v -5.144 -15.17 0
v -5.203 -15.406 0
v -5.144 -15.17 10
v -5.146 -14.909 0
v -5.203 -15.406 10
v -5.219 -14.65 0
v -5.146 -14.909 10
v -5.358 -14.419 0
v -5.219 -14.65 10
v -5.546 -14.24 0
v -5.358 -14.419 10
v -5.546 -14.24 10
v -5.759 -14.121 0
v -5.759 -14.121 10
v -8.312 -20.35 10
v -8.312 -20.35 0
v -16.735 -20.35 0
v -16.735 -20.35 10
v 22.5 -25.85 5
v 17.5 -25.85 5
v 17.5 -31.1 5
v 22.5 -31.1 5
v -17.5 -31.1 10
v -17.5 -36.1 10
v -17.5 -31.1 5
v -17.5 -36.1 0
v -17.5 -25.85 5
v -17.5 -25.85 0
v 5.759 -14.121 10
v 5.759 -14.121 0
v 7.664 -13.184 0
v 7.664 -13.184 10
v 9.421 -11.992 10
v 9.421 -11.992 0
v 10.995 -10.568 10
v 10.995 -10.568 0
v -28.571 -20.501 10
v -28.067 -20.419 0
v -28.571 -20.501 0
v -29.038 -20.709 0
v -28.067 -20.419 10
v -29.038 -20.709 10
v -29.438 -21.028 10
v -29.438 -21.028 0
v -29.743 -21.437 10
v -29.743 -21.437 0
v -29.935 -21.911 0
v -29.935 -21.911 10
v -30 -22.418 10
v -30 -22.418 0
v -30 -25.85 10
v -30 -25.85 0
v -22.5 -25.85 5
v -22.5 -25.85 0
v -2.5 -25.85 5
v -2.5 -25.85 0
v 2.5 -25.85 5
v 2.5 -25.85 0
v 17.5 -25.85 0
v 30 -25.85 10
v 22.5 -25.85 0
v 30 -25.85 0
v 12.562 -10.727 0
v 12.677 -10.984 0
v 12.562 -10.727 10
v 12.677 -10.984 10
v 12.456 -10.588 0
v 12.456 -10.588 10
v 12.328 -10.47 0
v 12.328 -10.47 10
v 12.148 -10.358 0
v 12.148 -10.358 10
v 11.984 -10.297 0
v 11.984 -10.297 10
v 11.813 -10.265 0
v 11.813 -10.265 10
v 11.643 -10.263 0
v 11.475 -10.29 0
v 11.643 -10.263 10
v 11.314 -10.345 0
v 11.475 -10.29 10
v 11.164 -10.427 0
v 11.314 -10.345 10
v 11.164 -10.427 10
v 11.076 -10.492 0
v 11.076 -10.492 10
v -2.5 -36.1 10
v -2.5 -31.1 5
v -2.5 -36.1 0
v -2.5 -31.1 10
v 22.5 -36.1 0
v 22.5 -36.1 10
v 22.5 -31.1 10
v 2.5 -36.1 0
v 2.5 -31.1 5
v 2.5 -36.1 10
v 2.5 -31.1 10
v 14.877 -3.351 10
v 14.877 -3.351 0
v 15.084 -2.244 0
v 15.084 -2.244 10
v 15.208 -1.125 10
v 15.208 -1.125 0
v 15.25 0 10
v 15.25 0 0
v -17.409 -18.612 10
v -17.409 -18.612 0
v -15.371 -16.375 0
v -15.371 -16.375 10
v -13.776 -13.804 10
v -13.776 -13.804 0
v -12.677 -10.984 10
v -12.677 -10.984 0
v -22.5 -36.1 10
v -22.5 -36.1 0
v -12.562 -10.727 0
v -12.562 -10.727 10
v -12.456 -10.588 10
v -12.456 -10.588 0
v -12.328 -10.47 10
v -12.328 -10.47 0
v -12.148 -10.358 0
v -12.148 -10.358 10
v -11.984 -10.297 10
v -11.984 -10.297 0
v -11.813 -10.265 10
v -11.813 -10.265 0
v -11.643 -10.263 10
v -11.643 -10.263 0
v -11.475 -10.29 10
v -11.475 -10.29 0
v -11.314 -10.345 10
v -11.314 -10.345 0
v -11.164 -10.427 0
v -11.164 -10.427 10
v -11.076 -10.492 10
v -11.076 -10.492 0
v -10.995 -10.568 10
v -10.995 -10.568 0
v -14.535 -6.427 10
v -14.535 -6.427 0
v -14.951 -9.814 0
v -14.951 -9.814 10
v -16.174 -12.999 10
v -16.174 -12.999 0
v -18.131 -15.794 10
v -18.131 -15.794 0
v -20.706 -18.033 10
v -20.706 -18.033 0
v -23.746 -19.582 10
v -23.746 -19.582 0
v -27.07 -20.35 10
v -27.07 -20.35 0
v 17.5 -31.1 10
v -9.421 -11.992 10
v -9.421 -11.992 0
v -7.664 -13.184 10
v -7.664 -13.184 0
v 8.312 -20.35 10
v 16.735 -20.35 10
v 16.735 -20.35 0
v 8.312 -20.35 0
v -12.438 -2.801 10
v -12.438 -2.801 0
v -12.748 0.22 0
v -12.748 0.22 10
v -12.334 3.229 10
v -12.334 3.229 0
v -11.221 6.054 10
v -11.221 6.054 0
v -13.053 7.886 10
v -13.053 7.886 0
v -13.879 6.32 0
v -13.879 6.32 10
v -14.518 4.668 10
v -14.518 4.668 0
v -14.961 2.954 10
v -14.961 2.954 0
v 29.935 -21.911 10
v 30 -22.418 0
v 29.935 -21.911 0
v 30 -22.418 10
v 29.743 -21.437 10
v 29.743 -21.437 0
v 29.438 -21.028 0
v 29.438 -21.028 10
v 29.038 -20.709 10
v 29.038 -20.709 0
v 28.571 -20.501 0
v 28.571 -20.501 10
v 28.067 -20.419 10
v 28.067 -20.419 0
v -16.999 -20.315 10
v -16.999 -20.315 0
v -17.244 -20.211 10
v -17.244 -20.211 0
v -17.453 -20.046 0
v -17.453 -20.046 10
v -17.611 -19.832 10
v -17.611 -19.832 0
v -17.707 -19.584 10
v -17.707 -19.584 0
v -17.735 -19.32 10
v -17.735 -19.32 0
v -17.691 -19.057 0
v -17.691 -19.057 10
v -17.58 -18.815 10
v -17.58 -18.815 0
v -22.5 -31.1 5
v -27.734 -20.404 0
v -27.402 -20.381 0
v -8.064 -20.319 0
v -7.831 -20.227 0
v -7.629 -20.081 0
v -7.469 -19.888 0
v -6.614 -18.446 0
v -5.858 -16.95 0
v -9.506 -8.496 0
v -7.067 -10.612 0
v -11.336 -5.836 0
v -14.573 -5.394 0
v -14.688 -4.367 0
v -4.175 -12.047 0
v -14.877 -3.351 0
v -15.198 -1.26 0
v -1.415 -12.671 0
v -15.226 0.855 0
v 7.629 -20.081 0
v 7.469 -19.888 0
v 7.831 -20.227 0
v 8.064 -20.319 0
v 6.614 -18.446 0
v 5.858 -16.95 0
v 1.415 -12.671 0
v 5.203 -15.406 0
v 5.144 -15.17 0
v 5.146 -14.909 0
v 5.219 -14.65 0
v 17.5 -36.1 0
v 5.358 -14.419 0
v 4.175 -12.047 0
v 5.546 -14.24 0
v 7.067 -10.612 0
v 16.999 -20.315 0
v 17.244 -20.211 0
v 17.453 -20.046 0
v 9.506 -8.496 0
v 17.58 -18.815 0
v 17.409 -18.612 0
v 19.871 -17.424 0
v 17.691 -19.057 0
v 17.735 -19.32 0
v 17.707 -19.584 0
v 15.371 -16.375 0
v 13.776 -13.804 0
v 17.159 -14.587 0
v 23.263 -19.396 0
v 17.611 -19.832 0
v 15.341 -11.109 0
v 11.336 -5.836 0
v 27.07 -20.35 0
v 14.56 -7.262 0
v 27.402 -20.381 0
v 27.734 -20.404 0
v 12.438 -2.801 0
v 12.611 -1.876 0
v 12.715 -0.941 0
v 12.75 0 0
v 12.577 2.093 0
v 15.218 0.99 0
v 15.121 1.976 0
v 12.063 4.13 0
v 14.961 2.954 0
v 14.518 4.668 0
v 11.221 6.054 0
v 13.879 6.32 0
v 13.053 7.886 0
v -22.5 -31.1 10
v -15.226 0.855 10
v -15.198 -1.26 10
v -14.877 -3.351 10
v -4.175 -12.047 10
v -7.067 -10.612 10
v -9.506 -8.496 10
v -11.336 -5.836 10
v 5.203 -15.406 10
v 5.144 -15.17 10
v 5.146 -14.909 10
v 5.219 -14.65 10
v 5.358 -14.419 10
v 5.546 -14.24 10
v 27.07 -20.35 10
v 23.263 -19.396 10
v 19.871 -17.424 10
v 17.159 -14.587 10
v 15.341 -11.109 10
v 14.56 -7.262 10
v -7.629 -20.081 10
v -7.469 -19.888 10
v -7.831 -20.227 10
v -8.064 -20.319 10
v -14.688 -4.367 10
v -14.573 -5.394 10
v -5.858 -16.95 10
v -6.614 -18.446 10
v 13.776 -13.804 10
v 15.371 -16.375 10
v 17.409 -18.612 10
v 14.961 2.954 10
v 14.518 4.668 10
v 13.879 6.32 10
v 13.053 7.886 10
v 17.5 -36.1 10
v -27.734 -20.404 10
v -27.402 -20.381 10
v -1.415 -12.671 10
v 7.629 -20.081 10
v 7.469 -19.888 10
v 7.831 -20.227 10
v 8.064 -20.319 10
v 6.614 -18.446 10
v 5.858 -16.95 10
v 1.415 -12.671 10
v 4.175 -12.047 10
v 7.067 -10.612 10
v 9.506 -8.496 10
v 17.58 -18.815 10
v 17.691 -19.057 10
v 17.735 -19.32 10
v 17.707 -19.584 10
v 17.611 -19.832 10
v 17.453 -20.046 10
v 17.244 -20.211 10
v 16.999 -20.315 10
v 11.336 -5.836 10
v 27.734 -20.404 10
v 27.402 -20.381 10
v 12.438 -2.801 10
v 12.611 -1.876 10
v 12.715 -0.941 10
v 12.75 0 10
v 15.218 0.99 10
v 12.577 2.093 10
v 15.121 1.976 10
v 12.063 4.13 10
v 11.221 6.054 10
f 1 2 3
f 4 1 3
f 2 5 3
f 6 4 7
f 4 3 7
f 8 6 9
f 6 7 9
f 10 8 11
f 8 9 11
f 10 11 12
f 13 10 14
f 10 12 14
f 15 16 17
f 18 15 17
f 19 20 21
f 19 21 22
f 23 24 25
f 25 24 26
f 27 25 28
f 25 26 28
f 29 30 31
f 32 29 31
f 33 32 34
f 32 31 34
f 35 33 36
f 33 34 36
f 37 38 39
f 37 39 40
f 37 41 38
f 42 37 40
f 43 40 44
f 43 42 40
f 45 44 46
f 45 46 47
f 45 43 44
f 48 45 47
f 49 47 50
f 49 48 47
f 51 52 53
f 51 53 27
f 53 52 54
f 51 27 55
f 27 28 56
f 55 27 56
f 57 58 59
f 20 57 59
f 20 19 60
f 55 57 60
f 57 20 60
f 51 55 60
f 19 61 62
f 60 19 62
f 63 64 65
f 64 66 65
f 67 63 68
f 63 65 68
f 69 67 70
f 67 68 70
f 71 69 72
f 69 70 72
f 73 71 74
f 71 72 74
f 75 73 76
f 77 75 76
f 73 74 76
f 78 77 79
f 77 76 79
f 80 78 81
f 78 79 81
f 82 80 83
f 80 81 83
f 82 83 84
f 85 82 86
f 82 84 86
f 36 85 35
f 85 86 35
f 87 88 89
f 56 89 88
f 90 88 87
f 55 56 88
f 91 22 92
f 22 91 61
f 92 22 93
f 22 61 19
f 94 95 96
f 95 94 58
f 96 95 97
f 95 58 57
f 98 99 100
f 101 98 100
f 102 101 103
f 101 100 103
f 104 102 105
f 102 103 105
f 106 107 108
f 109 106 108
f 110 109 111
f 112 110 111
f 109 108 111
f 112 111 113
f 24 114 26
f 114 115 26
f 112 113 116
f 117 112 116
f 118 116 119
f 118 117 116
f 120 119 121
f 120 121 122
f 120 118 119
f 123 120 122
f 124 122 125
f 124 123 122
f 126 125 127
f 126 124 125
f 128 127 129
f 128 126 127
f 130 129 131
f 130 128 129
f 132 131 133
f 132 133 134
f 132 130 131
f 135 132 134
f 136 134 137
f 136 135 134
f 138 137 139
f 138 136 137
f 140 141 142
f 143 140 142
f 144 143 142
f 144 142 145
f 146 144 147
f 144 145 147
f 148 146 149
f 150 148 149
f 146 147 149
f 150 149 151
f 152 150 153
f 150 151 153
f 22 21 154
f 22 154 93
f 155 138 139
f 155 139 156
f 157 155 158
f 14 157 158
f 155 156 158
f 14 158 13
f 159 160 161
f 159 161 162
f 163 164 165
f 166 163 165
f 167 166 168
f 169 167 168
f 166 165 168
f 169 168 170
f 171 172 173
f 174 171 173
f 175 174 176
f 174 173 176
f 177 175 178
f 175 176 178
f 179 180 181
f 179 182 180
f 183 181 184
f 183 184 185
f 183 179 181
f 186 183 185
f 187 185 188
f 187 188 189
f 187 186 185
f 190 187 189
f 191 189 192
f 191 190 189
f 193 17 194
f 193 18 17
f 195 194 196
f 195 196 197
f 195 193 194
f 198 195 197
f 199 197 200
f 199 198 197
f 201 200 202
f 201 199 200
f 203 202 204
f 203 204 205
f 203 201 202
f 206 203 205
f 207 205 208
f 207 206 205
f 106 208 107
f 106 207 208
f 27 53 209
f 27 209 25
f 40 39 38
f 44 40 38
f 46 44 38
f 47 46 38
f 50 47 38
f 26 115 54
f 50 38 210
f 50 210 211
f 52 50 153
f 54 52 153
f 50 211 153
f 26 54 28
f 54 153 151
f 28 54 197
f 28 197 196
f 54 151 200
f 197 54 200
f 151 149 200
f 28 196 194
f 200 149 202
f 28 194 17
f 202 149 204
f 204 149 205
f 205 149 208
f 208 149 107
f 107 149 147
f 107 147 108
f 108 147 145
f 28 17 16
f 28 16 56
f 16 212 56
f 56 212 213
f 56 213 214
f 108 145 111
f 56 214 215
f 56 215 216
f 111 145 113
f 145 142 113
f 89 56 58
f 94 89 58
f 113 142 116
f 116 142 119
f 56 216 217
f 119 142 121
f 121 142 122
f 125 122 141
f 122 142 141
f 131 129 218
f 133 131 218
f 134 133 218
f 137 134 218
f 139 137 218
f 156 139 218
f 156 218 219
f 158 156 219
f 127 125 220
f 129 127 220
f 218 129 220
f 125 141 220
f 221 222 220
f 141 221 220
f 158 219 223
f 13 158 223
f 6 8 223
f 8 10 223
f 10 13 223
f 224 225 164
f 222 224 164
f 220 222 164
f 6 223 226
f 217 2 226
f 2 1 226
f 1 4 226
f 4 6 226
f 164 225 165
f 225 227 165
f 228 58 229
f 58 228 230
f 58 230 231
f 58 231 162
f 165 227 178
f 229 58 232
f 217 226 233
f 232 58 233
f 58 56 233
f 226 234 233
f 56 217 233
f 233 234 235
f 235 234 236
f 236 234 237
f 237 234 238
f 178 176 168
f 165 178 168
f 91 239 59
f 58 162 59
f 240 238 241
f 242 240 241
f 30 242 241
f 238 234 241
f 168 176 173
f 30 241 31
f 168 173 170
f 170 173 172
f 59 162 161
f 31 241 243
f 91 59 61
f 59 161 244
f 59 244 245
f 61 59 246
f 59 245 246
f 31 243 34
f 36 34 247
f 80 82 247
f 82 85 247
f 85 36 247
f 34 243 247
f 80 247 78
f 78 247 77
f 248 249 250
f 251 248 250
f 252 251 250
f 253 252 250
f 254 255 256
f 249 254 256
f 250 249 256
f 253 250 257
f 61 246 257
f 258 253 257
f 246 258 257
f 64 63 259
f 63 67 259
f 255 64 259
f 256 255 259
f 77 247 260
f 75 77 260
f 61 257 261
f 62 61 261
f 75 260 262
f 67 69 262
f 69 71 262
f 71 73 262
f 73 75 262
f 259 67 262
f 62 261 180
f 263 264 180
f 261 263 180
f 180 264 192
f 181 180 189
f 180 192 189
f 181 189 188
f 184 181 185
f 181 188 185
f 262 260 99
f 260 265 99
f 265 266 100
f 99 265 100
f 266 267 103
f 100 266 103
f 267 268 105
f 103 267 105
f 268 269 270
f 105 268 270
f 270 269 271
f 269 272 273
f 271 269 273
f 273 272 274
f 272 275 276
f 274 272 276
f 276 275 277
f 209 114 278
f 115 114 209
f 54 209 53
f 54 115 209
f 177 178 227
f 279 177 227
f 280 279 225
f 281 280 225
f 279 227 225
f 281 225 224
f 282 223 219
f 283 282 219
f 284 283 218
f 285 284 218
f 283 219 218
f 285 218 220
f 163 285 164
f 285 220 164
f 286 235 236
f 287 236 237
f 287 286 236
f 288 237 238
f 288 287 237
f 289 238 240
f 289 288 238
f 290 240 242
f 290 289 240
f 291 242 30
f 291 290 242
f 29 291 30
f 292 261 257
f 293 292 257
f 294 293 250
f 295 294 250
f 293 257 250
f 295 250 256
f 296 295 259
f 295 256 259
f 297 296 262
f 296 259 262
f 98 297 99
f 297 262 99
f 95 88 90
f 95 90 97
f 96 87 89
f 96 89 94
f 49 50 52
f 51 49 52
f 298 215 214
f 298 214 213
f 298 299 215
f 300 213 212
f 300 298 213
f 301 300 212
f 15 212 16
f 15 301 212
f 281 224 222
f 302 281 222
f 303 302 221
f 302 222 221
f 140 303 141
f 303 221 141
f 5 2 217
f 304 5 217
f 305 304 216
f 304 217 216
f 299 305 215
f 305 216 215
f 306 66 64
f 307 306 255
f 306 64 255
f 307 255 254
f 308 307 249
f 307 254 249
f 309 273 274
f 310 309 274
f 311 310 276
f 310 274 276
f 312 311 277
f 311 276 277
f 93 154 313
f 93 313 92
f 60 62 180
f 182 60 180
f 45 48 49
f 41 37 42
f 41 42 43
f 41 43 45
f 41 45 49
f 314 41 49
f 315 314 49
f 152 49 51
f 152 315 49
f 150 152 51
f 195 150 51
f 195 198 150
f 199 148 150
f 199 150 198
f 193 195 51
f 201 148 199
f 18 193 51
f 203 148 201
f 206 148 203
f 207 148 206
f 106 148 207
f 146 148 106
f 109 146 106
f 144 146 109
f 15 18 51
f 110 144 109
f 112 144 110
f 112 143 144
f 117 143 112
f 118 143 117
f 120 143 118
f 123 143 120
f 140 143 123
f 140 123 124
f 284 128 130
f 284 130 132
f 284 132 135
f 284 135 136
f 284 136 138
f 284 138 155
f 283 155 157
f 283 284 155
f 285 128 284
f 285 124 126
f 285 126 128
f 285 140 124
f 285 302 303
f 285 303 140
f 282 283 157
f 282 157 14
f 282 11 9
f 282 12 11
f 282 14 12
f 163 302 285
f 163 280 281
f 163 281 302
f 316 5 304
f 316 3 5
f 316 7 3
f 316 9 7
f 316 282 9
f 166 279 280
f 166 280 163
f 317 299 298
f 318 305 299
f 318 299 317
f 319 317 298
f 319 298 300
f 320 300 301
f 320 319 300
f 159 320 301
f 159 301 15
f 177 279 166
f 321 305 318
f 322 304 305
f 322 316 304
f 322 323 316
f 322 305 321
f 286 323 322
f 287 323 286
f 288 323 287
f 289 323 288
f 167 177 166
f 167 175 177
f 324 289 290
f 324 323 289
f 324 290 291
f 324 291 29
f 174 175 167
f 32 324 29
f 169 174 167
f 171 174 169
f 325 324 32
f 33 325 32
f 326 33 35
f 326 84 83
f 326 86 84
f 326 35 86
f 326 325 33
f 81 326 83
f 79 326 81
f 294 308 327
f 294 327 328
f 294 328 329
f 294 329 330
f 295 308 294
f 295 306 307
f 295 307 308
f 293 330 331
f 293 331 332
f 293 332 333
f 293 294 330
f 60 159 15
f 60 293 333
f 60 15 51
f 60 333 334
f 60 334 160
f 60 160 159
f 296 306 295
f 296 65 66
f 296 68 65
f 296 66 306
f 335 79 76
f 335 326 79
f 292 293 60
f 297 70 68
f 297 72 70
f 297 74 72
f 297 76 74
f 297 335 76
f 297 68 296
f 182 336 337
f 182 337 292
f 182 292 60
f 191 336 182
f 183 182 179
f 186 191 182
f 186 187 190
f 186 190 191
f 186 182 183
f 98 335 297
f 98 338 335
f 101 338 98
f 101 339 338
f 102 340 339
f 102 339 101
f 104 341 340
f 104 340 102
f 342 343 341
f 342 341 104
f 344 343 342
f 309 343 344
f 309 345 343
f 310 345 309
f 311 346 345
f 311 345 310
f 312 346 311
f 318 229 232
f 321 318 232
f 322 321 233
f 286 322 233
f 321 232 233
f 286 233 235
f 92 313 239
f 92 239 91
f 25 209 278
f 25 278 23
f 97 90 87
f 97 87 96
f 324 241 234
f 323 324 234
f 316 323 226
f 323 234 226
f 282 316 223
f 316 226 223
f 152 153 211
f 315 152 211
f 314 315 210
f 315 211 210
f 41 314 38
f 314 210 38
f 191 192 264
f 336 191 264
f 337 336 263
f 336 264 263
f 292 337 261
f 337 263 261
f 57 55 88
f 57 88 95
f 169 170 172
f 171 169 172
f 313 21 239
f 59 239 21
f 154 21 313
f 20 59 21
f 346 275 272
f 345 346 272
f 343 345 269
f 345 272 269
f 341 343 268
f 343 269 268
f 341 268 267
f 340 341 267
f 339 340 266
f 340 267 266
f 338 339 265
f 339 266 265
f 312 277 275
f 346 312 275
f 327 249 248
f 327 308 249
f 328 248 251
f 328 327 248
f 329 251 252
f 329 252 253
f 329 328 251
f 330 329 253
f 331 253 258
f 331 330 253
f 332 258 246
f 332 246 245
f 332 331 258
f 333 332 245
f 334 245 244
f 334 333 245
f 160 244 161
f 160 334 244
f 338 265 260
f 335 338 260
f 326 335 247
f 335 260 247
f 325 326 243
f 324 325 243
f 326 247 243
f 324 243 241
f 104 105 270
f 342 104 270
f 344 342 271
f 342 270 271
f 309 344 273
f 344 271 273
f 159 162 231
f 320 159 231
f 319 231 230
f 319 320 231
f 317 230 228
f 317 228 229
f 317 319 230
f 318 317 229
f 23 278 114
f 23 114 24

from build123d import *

# Parameters (mm, degrees)
F1_DEPTH = 10
F2_R     = 1
F3_R     = 2
F4_W     = 5
F4_H     = 5
F5_DEPTH = 10.25
F6_W     = 5
F6_H     = 5
F7_W     = 5
F7_H     = 5
F8_W     = 5
F8_H     = 5
F9_DEPTH = 5


with BuildPart() as f1:
    # F0 (on Top) → F1 (new body)
    with BuildSketch(Plane.XY):
        with BuildLine():
            ThreePointArc((4.8593298853, -14.4550826032), (4.4870695728, -13.259622802), (4.1751297651, -12.0470241738))
            ThreePointArc((4.1751297651, -12.0470241738), (0, -12.75), (-4.1751297651, -12.0470241738))
            ThreePointArc((-4.1751297651, -12.0470241738), (-4.4870695728, -13.259622802), (-4.8593298853, -14.4550826032))
            ThreePointArc((-4.8593298853, -14.4550826032), (-2.4619596159, -15.0499586328), (0, -15.25))
            ThreePointArc((0, -15.25), (2.4619596159, -15.0499586328), (4.8593298853, -14.4550826032))
        make_face()
        with BuildLine():
            ThreePointArc((0, -15.25), (-2.4619596159, -15.0499586328), (-4.8593298853, -14.4550826032))
            ThreePointArc((-4.8593298853, -14.4550826032), (-6.1206106512, -17.4986832949), (-7.7711643122, -20.35))
            Line((-7.7711643122, -20.35), (0, -20.35))
            Line((0, -20.35), (0, -15.25))
        make_face()
        with BuildLine():
            ThreePointArc((7.7711643122, -20.35), (6.1206106512, -17.4986832949), (4.8593298853, -14.4550826032))
            ThreePointArc((4.8593298853, -14.4550826032), (2.4619596159, -15.0499586328), (0, -15.25))
            Line((0, -15.25), (0, -20.35))
            Line((0, -20.35), (7.7711643122, -20.35))
        make_face()
        with BuildLine():
            ThreePointArc((-12.1977073115, -25.35), (-9.8167372296, -22.998464997), (-7.7711643122, -20.35))
            Line((-7.7711643122, -20.35), (-19.6810808999, -20.35))
            ThreePointArc((-19.6810808999, -20.35), (-24.6329372033, -22.4587536765), (-30, -22.8616926958))
            Line((-30, -22.8616926958), (-30, -25.35))
            Line((-30, -25.35), (-12.1977073115, -25.35))
        make_face()
        with BuildLine():
            Line((-30, -20.35), (-30, -22.8616926958))
            ThreePointArc((-30, -22.8616926958), (-24.6329372033, -22.4587536765), (-19.6810808999, -20.35))
            Line((-19.6810808999, -20.35), (-27.0704207387, -20.35))
            ThreePointArc((-27.0704207387, -20.35), (-28.5352103694, -20.4268397503), (-30, -20.35))
        make_face()
        with BuildLine():
            Line((0, -20.35), (-7.7711643122, -20.35))
            ThreePointArc((-7.7711643122, -20.35), (-9.8167372296, -22.998464997), (-12.1977073115, -25.35))
            Line((-12.1977073115, -25.35), (0, -25.35))
            Line((0, -25.35), (0, -20.35))
        make_face()
        with BuildLine():
            ThreePointArc((12.1977073115, -25.35), (9.8167372296, -22.998464997), (7.7711643122, -20.35))
            Line((7.7711643122, -20.35), (0, -20.35))
            Line((0, -20.35), (0, -25.35))
            Line((0, -25.35), (12.1977073115, -25.35))
        make_face()
        with BuildLine():
            Line((19.6810808999, -20.35), (7.7711643122, -20.35))
            ThreePointArc((7.7711643122, -20.35), (9.8167372296, -22.998464997), (12.1977073115, -25.35))
            Line((12.1977073115, -25.35), (30, -25.35))
            Line((30, -25.35), (30, -22.8616926958))
            ThreePointArc((30, -22.8616926958), (24.6329372033, -22.4587536765), (19.6810808999, -20.35))
        make_face()
        with BuildLine():
            Line((27.0704207387, -20.35), (19.6810808999, -20.35))
            ThreePointArc((19.6810808999, -20.35), (24.6329372033, -22.4587536765), (30, -22.8616926958))
            Line((30, -22.8616926958), (30, -20.35))
            ThreePointArc((30, -20.35), (28.5352103694, -20.4268397503), (27.0704207387, -20.35))
        make_face()
        with BuildLine():
            ThreePointArc((-12.0352103694, -6.4268397503), (-12.1363238462, -4.6029645348), (-12.438425012, -2.8014430604))
            ThreePointArc((-12.438425012, -2.8014430604), (-13.4233051179, 0.1973824432), (-14.9612028693, 2.9537956434))
            ThreePointArc((-14.9612028693, 2.9537956434), (-15.2486507313, -0.2028567877), (-14.8773319104, -3.3507454733))
            ThreePointArc((-14.8773319104, -3.3507454733), (-13.863287972, -6.3538765023), (-12.2503272762, -9.0825096547))
            ThreePointArc((-12.2503272762, -9.0825096547), (-12.0890775255, -7.7590238521), (-12.0352103694, -6.4268397503))
        make_face()
        with BuildLine():
            ThreePointArc((-4.8593298853, -14.4550826032), (-4.4870695728, -13.259622802), (-4.1751297651, -12.0470241738))
            ThreePointArc((-4.1751297651, -12.0470241738), (-9.5064579689, -8.4964555484), (-12.438425012, -2.8014430604))
            ThreePointArc((-12.438425012, -2.8014430604), (-12.1363238462, -4.6029645348), (-12.0352103694, -6.4268397503))
            ThreePointArc((-12.0352103694, -6.4268397503), (-12.0890775255, -7.7590238521), (-12.2503272762, -9.0825096547))
            ThreePointArc((-12.2503272762, -9.0825096547), (-8.9666731326, -12.3353667531), (-4.8593298853, -14.4550826032))
        make_face()
        with BuildLine():
            ThreePointArc((12.4384250802, -2.8014427577), (9.5064580723, -8.4964554327), (4.1751297651, -12.0470241738))
            ThreePointArc((4.1751297651, -12.0470241738), (4.4870695728, -13.259622802), (4.8593298853, -14.4550826032))
            ThreePointArc((4.8593298853, -14.4550826032), (8.9666731326, -12.3353667531), (12.2503272762, -9.0825096547))
            ThreePointArc((12.2503272762, -9.0825096547), (12.0426040821, -5.9329391), (12.4384250802, -2.8014427577))
        make_face()
        with BuildLine():
            ThreePointArc((14.9612028693, 2.9537956434), (13.4233051801, 0.1973825853), (12.4384250802, -2.8014427577))
            ThreePointArc((12.4384250802, -2.8014427577), (12.0426040821, -5.9329391), (12.2503272762, -9.0825096547))
            ThreePointArc((12.2503272762, -9.0825096547), (13.8632879655, -6.3538765165), (14.8773319036, -3.3507455038))
            ThreePointArc((14.8773319036, -3.3507455038), (15.1565466306, -1.6857028906), (15.25, 0))
            ThreePointArc((15.25, 0), (15.177628994, 1.4839400666), (14.9612028693, 2.9537956434))
        make_face()
        with BuildLine():
            ThreePointArc((-19.6810808999, -20.35), (-14.7609019356, -15.5108051385), (-12.2503272762, -9.0825096547))
            ThreePointArc((-12.2503272762, -9.0825096547), (-13.863287972, -6.3538765023), (-14.8773319104, -3.3507454733))
            ThreePointArc((-14.8773319104, -3.3507454733), (-14.621003629, -4.8793092054), (-14.5352103694, -6.4268397503))
            ThreePointArc((-14.5352103694, -6.4268397503), (-18.1307148307, -15.7941484666), (-27.0704207387, -20.35))
            Line((-27.0704207387, -20.35), (-19.6810808999, -20.35))
        make_face()
        with BuildLine():
            ThreePointArc((14.8773319036, -3.3507455038), (13.8632879655, -6.3538765165), (12.2503272762, -9.0825096547))
            ThreePointArc((12.2503272762, -9.0825096547), (14.7609019356, -15.5108051385), (19.6810808999, -20.35))
            Line((19.6810808999, -20.35), (27.0704207387, -20.35))
            ThreePointArc((27.0704207387, -20.35), (17.1590319273, -14.5866537221), (14.8773319036, -3.3507455038))
        make_face()
        with BuildLine():
            ThreePointArc((-12.438425012, -2.8014430604), (-12.6311834993, 1.7365780743), (-11.2209196713, 6.0542102482))
            Line((-11.2209196713, 6.0542102482), (-13.0527161264, 7.8860067033))
            ThreePointArc((-13.0527161264, 7.8860067033), (-14.2223975074, 5.5032634991), (-14.9612028693, 2.9537956434))
            ThreePointArc((-14.9612028693, 2.9537956434), (-13.4233051179, 0.1973824432), (-12.438425012, -2.8014430604))
        make_face()
        with BuildLine():
            Line((13.0527161264, 7.8860067033), (11.2209196713, 6.0542102482))
            ThreePointArc((11.2209196713, 6.0542102482), (12.3618207763, 3.1221606454), (12.75, 0))
            ThreePointArc((12.75, 0), (12.6718668667, -1.4093580502), (12.4384250802, -2.8014427577))
            ThreePointArc((12.4384250802, -2.8014427577), (13.4233051801, 0.1973825853), (14.9612028693, 2.9537956434))
            ThreePointArc((14.9612028693, 2.9537956434), (14.2223975074, 5.5032634991), (13.0527161264, 7.8860067033))
        make_face()
        with BuildLine():
            Line((-30, -25.85), (-12.7954249224, -25.85))
            ThreePointArc((-12.7954249224, -25.85), (-12.4946178162, -25.6023290673), (-12.1977073115, -25.35))
            Line((-12.1977073115, -25.35), (-30, -25.35))
            Line((-30, -25.35), (-30, -25.85))
        make_face()
        with BuildLine():
            ThreePointArc((12.7954249224, -25.85), (12.4946178162, -25.6023290673), (12.1977073115, -25.35))
            Line((12.1977073115, -25.35), (0, -25.35))
            Line((0, -25.35), (-12.1977073115, -25.35))
            ThreePointArc((-12.1977073115, -25.35), (-12.4946178162, -25.6023290673), (-12.7954249224, -25.85))
            Line((-12.7954249224, -25.85), (12.7954249224, -25.85))
        make_face()
        with BuildLine():
            Line((30, -25.35), (12.1977073115, -25.35))
            ThreePointArc((12.1977073115, -25.35), (12.4946178162, -25.6023290673), (12.7954249224, -25.85))
            Line((12.7954249224, -25.85), (30, -25.85))
            Line((30, -25.85), (30, -25.35))
        make_face()
    extrude(amount=F1_DEPTH)

    # F2
    f2_edges = [f1.edges().sort_by_distance(p)[0] for p in [
        (-7.771164, -20.35, 5),
        (-4.85933, -14.455083, 5),
        (-12.250327, -9.08251, 5),
        (-19.681081, -20.35, 5),
        (7.771164, -20.35, 5),
        (4.85933, -14.455083, 5),
        (12.250327, -9.08251, 5),
        (19.681081, -20.35, 5),
    ]]
    fillet(f2_edges, radius=F2_R)

    # F3
    f3_edges = [f1.edges().sort_by_distance(p)[0] for p in [
        (30, -20.35, 5),
        (-30, -20.35, 5),
    ]]
    fillet(f3_edges, radius=F3_R)

    # F4 (on face) → F5 (join)
    with BuildSketch(Plane.XZ.offset(25.85)):
        with Locations((-20, 2.5)):
            Rectangle(F4_W, F4_H)
        with Locations((0, 2.5)):
            Rectangle(F4_W, F4_H)
        with Locations((20, 2.5)):
            Rectangle(F4_W, F4_H)
    extrude(amount=F5_DEPTH)

    # F6 (on face) + F7 (on face) + F8 (on face) → F9 (join)
    with BuildSketch(Plane.XY.offset(5)):
        with Locations((-20, -33.6)):
            Rectangle(F6_W, F6_H)
    with BuildSketch(Plane.XY.offset(5)):
        with Locations((0, -33.6)):
            Rectangle(F7_W, F7_H)
    with BuildSketch(Plane.XY.offset(5)):
        with Locations((20, -33.6)):
            Rectangle(F8_W, F8_H)
    extrude(amount=F9_DEPTH)


solid = f1.part
